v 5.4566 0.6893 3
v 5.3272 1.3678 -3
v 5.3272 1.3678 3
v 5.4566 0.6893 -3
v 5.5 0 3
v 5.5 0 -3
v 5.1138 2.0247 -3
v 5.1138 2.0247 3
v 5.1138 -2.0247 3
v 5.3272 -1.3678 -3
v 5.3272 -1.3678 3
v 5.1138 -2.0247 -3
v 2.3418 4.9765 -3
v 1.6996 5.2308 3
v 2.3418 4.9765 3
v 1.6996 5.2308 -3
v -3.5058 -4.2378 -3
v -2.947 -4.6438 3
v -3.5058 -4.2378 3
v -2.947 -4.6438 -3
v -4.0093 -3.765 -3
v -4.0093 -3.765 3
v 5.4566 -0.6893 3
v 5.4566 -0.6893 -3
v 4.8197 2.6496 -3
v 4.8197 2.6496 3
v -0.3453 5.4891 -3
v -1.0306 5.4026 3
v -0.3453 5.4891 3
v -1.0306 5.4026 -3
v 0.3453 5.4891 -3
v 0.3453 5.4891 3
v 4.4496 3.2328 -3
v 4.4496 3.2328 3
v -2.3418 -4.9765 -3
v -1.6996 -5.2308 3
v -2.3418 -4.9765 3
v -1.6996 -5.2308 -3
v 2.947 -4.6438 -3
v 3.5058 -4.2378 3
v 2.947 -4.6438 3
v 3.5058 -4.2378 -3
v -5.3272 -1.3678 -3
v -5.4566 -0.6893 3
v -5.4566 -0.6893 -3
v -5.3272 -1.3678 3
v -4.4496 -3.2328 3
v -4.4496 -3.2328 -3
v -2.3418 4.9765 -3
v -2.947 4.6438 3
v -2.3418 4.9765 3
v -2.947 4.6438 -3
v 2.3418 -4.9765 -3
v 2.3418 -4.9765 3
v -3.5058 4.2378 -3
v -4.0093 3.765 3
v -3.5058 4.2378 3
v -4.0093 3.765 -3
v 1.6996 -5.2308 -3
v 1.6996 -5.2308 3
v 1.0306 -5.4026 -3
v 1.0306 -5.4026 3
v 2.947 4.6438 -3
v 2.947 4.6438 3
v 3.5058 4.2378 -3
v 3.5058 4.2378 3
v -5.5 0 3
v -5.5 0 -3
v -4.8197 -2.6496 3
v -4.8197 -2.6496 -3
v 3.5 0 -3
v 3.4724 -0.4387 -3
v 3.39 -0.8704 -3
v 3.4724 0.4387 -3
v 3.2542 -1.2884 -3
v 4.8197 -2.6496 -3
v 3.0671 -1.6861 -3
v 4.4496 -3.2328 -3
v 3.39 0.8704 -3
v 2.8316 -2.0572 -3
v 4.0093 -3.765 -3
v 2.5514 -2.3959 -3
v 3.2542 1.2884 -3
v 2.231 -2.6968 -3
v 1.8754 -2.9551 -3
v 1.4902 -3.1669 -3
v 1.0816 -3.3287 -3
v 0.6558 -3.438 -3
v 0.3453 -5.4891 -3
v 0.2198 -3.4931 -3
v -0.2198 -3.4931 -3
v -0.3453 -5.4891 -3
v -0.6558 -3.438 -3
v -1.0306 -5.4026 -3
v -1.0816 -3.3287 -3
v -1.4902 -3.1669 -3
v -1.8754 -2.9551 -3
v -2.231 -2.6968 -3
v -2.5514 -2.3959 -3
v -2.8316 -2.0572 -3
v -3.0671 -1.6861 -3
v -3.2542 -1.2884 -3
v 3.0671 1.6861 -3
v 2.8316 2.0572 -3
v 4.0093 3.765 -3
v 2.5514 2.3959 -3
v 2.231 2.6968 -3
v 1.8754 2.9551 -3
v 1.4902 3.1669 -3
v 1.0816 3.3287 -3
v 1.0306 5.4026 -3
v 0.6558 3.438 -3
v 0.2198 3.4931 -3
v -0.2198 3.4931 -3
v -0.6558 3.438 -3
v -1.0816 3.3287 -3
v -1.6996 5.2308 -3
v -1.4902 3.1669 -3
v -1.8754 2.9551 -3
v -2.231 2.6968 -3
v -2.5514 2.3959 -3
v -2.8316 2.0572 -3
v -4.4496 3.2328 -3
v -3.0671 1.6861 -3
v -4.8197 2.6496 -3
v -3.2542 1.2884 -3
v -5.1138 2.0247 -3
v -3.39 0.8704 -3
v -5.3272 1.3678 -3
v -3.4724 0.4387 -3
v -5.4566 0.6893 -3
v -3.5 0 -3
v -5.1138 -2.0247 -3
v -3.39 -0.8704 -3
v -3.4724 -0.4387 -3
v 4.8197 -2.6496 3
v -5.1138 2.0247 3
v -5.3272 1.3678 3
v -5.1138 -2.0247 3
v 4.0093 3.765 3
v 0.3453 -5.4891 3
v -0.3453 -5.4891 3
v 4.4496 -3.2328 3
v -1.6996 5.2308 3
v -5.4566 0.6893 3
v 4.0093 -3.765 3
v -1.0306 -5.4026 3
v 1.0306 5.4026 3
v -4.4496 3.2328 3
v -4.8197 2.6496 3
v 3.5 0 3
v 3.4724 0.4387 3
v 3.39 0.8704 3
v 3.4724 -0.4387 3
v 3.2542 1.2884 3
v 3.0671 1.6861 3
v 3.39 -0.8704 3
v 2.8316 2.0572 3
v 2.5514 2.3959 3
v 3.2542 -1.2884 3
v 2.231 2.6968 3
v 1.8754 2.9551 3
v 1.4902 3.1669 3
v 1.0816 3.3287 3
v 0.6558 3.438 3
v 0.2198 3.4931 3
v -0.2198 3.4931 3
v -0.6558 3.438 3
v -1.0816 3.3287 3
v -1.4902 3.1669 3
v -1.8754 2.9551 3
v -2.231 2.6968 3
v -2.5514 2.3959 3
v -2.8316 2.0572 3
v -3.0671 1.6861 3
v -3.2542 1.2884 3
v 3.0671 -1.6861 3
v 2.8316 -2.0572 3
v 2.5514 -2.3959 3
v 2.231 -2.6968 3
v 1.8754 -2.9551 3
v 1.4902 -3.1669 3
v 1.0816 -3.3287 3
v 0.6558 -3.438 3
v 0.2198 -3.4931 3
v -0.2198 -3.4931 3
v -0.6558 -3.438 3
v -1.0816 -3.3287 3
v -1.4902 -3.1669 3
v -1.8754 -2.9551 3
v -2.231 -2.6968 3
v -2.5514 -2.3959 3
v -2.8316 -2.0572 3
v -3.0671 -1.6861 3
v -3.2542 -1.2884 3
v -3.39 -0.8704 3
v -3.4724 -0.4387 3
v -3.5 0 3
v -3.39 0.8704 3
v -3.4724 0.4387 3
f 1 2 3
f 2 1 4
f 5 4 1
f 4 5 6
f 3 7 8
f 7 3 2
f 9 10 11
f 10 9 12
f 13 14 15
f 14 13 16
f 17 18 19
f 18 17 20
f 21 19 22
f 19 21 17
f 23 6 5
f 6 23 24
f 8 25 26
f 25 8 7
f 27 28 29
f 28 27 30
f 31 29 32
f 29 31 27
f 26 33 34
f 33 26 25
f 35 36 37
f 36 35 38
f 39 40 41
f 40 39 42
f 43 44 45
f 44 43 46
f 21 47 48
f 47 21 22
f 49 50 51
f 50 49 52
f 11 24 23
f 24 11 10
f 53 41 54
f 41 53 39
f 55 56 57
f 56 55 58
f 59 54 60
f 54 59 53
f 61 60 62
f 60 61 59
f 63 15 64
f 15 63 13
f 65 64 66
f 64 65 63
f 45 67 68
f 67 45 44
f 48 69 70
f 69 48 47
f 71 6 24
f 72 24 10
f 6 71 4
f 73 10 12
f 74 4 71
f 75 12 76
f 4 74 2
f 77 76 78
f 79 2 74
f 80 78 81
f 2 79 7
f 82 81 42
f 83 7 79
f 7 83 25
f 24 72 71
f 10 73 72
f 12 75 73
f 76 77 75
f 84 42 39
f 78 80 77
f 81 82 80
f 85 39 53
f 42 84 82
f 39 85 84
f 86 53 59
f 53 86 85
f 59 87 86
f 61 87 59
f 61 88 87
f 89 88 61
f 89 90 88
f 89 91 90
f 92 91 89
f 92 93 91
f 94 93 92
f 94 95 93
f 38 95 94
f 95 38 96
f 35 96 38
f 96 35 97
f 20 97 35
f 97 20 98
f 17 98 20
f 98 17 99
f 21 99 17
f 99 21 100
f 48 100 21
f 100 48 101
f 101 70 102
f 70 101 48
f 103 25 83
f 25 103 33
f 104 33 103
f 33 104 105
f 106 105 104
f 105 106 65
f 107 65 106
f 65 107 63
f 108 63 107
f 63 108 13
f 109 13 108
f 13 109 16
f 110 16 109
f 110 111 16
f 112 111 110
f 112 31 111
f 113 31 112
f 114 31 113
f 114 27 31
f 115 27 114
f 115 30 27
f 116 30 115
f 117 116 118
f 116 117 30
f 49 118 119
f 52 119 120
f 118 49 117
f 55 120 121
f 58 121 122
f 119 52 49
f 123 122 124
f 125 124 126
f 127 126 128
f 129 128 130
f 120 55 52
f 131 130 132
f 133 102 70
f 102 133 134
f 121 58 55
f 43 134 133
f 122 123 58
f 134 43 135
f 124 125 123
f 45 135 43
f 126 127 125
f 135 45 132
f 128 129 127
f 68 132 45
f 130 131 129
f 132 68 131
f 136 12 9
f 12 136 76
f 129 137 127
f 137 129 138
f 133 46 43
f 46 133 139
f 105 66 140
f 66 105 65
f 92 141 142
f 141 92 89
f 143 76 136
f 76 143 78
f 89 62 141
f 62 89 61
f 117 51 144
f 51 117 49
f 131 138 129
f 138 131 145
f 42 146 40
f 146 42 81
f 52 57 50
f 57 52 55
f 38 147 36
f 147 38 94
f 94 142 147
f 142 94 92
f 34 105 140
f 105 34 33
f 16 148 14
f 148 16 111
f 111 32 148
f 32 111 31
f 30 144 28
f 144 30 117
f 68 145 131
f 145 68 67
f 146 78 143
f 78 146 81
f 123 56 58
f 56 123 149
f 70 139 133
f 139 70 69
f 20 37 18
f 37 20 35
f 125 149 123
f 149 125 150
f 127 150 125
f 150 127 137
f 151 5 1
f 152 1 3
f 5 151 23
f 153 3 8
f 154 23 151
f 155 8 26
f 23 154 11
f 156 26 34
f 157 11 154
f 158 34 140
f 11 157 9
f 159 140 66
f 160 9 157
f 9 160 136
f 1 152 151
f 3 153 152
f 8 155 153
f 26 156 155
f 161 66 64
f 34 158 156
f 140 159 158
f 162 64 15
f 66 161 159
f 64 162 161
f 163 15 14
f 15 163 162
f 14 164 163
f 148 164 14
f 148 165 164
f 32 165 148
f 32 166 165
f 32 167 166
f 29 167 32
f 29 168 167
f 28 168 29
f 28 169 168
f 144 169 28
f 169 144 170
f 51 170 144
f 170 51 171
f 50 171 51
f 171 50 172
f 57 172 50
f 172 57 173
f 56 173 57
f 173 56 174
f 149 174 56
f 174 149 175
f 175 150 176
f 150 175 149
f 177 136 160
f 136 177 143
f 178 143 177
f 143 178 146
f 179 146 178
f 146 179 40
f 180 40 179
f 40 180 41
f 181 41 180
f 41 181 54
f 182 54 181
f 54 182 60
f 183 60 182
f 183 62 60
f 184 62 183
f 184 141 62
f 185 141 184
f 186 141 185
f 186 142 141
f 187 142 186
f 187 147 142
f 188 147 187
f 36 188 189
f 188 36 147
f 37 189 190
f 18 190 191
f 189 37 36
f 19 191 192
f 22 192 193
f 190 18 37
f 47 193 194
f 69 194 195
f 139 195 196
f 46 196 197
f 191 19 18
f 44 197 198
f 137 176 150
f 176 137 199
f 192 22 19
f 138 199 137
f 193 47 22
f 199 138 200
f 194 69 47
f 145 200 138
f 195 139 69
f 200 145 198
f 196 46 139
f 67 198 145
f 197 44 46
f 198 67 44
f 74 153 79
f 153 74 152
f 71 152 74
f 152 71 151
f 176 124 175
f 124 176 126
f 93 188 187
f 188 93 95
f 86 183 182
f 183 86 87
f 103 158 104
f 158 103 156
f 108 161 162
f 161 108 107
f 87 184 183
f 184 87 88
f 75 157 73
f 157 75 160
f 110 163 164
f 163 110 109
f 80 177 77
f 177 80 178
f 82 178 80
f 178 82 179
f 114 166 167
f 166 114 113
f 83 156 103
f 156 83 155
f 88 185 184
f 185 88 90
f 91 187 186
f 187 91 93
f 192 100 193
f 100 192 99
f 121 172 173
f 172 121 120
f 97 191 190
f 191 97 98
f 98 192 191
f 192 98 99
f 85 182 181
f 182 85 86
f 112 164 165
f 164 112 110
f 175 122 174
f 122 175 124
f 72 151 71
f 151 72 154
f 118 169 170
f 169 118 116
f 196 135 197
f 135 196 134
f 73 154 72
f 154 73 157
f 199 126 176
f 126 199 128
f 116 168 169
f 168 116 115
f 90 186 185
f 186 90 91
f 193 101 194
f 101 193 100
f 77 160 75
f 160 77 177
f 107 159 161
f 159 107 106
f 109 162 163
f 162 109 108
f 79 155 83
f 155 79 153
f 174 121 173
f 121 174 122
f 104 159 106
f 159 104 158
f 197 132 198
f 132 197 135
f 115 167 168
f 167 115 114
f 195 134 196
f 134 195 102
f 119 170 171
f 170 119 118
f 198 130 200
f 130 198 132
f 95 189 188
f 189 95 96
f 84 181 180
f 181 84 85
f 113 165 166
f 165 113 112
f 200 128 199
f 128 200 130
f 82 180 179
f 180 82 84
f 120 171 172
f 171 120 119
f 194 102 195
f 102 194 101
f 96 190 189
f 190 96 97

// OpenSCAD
$fn = 50;


difference() {
	union() {
		translate(v = [0, 0, -3.0000000000]) {
			cylinder(h = 6, r = 5.5000000000);
		}
	}
	union() {
		translate(v = [0, 0, -100.0000000000]) {
			cylinder(h = 200, r = 3.5000000000);
		}
	}
}
